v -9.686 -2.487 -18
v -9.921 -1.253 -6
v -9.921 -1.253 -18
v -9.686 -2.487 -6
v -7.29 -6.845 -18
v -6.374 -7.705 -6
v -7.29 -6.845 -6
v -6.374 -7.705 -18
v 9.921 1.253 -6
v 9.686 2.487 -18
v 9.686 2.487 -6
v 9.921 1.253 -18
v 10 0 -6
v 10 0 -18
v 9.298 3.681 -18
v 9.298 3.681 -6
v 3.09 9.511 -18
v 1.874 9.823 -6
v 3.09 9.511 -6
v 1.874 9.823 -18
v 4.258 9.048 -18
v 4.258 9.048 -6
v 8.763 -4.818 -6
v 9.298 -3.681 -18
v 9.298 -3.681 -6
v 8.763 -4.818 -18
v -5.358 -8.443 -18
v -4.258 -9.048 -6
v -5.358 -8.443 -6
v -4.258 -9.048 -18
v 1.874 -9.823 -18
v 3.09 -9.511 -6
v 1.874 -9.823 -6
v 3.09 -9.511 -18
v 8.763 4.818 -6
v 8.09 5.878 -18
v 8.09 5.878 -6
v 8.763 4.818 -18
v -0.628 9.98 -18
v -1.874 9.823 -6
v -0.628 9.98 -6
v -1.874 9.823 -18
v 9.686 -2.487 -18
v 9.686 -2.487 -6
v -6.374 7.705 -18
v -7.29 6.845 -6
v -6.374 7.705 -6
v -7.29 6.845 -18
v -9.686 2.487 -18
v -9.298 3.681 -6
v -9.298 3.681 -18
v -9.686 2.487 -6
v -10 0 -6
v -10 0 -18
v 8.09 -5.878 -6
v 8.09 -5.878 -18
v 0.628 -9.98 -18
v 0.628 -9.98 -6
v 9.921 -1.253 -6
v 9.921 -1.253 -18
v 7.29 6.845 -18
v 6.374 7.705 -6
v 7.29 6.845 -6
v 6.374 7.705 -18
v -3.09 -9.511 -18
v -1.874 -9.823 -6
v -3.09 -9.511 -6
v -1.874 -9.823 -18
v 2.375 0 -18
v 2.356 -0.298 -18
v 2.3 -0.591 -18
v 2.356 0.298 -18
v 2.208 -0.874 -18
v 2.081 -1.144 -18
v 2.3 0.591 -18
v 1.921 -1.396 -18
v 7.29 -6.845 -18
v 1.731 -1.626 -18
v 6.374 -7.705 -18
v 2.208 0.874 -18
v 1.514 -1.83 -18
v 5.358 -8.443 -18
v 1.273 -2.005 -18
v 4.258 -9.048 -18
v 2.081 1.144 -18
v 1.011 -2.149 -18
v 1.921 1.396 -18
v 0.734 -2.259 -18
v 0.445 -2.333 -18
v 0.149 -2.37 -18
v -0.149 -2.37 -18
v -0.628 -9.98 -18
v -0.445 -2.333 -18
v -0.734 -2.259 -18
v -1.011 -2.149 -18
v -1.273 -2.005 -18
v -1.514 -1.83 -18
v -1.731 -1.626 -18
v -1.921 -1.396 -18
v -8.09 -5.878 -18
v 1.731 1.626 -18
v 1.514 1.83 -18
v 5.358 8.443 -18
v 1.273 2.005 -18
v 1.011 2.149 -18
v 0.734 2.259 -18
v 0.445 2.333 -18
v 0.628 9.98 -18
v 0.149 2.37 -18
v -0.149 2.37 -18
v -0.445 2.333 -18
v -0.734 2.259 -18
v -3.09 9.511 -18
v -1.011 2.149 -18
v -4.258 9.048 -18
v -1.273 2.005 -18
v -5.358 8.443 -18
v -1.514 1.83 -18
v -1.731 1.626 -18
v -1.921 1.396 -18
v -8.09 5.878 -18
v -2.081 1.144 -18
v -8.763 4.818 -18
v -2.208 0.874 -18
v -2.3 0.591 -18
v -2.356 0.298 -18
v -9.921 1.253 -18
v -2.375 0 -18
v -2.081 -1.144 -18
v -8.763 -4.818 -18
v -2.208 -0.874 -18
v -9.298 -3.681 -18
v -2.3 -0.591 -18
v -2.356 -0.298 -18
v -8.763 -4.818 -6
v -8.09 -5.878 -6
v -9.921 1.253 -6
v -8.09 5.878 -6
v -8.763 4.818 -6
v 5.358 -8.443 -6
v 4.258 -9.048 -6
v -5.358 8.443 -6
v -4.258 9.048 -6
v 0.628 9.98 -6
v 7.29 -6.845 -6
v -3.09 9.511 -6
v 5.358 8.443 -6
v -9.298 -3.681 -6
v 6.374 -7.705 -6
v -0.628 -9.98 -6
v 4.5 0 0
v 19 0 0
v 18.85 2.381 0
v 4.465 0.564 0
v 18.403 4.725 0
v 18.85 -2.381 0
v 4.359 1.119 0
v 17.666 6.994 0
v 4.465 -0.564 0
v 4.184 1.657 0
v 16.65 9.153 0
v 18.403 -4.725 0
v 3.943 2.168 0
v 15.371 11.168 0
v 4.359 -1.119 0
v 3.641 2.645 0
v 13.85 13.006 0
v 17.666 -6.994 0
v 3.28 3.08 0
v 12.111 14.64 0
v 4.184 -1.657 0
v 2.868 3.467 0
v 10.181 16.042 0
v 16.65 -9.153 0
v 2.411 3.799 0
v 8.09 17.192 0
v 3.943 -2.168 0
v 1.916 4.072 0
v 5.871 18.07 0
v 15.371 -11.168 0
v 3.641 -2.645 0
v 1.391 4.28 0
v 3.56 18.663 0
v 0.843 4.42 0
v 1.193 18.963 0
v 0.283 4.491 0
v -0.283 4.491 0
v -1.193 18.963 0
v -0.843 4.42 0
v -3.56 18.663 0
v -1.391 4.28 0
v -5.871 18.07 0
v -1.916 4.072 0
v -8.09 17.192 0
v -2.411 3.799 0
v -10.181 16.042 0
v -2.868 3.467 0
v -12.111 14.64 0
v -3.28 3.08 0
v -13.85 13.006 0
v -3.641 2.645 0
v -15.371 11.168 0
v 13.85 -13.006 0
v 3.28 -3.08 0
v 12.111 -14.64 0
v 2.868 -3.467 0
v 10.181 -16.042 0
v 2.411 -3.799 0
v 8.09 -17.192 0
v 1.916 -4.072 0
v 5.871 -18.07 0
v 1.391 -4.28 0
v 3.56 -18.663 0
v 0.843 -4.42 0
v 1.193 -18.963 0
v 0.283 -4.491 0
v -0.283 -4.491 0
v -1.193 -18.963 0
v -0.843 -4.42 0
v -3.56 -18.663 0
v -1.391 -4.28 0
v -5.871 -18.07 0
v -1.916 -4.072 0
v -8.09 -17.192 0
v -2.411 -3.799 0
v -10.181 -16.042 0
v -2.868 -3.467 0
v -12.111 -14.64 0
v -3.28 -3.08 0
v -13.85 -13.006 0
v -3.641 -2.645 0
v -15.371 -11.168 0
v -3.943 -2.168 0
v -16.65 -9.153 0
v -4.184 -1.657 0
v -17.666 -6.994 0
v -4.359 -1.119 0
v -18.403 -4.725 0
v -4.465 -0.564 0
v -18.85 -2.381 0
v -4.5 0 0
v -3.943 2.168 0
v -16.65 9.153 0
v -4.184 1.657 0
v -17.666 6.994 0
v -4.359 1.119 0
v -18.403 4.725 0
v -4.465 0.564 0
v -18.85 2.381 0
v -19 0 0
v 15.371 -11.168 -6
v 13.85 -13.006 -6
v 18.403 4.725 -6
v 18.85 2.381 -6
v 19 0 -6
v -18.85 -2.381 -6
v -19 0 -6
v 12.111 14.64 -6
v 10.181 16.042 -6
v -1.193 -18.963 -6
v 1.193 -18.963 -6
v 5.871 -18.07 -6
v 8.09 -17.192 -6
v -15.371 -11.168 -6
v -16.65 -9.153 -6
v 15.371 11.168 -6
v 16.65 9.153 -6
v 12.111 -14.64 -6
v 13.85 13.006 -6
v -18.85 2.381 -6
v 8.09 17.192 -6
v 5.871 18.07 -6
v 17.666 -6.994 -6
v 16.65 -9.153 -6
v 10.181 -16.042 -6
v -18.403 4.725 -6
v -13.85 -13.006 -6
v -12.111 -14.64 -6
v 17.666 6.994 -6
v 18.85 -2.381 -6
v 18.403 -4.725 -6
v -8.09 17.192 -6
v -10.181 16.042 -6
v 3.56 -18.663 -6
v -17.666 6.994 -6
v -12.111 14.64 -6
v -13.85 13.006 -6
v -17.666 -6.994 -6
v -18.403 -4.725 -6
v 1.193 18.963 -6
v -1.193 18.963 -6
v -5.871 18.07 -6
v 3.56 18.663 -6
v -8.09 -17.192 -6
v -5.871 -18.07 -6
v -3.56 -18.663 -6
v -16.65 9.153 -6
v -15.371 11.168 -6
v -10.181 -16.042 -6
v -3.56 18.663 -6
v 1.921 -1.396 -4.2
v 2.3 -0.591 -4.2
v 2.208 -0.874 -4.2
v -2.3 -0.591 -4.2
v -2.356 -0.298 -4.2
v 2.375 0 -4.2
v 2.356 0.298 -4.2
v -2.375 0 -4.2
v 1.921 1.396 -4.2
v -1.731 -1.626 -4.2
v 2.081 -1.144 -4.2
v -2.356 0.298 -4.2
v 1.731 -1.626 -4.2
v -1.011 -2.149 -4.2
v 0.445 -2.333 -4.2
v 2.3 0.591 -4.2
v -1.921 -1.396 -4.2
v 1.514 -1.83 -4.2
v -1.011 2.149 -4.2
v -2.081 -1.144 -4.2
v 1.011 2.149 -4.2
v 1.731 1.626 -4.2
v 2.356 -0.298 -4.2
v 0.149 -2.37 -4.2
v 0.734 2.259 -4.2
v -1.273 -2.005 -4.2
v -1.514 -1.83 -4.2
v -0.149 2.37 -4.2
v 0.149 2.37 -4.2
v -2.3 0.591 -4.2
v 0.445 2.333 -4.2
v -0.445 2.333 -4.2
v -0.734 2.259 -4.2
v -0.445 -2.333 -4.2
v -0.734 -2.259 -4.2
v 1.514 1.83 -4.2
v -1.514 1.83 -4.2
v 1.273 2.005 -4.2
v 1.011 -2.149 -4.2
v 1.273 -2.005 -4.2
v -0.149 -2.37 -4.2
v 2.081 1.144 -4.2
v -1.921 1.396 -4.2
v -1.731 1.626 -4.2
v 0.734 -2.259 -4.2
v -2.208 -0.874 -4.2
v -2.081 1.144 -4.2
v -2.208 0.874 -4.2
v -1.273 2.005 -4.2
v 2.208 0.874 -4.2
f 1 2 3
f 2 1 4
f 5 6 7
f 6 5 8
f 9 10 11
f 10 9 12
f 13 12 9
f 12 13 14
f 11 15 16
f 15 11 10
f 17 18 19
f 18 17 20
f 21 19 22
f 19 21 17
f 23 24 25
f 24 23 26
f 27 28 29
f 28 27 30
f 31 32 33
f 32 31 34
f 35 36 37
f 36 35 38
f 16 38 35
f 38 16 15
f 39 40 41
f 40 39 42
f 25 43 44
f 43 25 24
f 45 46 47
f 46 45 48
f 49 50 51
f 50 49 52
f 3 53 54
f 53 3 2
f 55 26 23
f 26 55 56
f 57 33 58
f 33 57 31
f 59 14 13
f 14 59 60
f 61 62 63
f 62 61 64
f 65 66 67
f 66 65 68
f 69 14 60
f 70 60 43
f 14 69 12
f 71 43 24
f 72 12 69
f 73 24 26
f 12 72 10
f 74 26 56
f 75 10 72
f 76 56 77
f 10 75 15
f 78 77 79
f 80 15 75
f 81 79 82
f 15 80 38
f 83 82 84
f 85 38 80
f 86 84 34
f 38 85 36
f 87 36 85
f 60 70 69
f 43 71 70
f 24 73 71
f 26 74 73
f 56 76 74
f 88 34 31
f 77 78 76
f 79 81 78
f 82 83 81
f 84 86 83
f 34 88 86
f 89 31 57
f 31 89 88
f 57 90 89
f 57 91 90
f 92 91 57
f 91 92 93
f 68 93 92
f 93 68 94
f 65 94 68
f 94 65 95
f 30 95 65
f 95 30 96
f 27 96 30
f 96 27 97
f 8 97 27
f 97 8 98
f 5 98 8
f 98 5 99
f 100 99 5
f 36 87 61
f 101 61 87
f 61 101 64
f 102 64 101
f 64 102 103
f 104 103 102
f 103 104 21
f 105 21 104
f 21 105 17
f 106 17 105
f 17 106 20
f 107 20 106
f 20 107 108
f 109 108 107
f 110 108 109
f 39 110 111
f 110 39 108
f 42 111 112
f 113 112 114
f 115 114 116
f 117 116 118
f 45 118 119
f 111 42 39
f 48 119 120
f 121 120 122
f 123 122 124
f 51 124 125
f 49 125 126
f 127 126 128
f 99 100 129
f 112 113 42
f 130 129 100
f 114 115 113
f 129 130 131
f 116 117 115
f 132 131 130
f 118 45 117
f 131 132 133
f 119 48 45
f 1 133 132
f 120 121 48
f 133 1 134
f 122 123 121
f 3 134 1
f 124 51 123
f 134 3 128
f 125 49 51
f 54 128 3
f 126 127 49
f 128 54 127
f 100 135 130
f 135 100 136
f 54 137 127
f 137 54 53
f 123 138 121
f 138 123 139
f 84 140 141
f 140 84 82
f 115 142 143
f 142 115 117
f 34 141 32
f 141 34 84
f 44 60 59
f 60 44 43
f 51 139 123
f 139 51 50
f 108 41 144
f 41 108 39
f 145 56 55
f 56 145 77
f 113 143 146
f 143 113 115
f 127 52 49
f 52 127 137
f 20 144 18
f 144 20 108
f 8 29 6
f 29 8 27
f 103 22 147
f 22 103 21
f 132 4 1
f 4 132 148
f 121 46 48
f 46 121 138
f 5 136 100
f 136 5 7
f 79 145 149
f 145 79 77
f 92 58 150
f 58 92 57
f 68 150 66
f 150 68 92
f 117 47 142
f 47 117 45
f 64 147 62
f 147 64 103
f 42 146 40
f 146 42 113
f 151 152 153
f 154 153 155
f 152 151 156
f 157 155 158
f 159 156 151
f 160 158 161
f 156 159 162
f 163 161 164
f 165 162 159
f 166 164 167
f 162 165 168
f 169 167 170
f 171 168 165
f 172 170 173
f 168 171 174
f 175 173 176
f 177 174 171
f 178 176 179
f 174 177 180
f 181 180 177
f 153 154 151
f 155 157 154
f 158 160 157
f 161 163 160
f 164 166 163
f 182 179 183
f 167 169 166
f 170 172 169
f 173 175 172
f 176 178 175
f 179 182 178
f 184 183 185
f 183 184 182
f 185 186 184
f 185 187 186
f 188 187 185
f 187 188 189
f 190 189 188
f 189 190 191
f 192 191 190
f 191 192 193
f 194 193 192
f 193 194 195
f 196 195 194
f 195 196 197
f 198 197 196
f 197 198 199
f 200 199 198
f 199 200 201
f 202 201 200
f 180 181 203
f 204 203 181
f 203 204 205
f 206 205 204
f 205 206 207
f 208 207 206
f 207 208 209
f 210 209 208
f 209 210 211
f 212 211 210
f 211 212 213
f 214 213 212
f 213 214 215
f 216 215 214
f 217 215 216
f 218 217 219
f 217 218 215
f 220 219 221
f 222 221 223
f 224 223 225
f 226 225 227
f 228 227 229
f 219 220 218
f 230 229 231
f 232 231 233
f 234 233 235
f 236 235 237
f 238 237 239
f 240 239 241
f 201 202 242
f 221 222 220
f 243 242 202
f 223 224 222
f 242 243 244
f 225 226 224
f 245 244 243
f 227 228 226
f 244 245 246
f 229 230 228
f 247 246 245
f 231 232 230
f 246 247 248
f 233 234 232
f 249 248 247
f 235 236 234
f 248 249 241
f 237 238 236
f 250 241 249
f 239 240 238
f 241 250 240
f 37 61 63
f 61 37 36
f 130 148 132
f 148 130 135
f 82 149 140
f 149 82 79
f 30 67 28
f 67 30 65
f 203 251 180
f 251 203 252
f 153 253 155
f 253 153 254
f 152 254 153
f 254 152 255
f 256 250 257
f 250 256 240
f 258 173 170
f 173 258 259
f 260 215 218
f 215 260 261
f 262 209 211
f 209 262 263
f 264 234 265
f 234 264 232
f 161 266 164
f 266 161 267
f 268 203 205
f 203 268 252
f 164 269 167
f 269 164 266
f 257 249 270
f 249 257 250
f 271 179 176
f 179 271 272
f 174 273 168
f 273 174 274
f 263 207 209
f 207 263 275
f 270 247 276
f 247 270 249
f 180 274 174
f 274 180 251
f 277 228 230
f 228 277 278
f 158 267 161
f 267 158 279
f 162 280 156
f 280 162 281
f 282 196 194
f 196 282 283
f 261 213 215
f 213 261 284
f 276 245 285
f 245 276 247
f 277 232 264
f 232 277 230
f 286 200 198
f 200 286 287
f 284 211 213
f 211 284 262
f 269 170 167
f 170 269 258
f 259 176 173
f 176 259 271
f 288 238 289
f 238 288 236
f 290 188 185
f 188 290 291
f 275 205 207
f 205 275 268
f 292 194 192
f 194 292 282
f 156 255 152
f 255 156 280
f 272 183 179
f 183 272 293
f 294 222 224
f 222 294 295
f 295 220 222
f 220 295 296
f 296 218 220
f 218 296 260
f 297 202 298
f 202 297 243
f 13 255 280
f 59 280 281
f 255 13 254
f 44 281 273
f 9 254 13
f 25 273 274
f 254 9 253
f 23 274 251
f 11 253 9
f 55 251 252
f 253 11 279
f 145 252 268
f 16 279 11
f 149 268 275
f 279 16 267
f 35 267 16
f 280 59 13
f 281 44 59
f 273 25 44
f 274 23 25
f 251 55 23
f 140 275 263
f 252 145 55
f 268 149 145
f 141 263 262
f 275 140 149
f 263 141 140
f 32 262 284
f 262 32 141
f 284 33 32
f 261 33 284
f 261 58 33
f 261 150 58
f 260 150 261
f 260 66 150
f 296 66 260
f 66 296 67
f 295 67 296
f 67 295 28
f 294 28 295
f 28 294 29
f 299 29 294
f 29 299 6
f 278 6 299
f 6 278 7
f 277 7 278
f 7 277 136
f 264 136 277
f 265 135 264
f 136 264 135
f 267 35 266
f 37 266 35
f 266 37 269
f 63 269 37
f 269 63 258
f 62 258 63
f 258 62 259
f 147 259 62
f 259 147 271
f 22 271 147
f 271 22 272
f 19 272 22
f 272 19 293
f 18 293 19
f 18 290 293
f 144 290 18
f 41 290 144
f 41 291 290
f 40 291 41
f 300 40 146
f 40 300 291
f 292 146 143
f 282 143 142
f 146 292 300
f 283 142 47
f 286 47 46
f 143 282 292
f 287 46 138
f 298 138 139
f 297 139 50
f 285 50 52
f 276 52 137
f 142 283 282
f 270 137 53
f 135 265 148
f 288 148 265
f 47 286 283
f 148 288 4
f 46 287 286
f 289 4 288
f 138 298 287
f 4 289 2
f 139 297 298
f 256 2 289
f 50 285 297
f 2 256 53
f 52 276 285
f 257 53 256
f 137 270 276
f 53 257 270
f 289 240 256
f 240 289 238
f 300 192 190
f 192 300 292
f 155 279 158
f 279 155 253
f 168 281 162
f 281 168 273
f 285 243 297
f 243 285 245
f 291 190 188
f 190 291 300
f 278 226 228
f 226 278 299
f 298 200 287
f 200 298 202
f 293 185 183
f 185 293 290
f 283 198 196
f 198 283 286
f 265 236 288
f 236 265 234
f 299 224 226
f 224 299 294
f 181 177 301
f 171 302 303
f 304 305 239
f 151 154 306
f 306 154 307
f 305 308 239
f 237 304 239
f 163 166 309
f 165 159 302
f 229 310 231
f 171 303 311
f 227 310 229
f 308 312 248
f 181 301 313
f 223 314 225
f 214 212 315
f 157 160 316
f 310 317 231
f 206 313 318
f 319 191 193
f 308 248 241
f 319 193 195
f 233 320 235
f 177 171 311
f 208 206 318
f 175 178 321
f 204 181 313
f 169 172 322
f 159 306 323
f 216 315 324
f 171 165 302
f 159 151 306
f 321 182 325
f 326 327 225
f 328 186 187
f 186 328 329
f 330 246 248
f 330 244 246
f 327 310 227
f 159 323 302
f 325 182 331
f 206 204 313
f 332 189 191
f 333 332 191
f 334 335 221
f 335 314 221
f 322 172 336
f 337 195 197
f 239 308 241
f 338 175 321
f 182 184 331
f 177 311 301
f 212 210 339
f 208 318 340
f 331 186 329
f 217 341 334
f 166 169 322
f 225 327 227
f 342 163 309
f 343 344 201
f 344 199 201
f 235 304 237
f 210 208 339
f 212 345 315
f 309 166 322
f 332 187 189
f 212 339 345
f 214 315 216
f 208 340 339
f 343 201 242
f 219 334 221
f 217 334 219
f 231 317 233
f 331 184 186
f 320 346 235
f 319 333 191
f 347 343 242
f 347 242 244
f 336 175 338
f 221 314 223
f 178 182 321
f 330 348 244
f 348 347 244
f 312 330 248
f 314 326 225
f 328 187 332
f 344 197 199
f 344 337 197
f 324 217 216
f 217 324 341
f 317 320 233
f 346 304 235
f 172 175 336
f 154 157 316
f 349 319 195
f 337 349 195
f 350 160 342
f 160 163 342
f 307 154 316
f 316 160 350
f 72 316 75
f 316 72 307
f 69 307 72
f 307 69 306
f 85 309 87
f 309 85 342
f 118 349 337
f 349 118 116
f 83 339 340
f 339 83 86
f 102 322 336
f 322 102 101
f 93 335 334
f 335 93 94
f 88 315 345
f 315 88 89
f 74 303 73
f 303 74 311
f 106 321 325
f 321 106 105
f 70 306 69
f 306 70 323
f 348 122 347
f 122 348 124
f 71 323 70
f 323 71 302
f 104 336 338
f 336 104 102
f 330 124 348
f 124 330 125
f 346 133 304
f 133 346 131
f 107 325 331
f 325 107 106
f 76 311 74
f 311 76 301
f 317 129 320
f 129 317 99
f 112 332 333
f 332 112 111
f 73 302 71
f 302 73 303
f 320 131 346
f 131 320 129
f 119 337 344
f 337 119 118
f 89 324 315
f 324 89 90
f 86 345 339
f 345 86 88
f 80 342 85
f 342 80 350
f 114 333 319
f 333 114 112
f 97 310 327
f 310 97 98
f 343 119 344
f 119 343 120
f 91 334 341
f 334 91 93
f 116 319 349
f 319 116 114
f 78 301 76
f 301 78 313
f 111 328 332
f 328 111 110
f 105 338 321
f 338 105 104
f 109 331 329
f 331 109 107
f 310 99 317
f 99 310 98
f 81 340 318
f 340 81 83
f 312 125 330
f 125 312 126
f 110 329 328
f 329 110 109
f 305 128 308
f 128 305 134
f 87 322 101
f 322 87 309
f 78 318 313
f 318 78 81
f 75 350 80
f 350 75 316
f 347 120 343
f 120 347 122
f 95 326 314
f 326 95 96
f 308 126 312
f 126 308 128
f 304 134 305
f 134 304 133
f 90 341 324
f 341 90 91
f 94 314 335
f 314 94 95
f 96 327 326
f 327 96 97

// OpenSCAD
$fn = 50;


difference() {
	union() {
		translate(v = [0, 0, -18.0000000000]) {
			cylinder(h = 18, r = 10.0000000000);
		}
		translate(v = [0, 0, -6.0000000000]) {
			cylinder(h = 6, r = 19.0000000000);
		}
	}
	union() {
		translate(v = [0, 0, 0]) {
			rotate(a = [0, 0, 0]) {
				difference() {
					union() {
						#translate(v = [0, 0, -18.0000000000]) {
							cylinder(h = 18, r = 2.2500000000);
						}
						#translate(v = [0, 0, -4.2000000000]) {
							cylinder(h = 4.2000000000, r = 10.0000000000, r1 = 2.3750000000, r2 = 4.5000000000);
						}
						#translate(v = [0, 0, -18.0000000000]) {
							cylinder(h = 18, r = 2.3750000000);
						}
						#translate(v = [0, 0, -18.0000000000]) {
							cylinder(h = 18, r = 2.2500000000);
						}
					}
					union();
				}
			}
		}
	}
}
